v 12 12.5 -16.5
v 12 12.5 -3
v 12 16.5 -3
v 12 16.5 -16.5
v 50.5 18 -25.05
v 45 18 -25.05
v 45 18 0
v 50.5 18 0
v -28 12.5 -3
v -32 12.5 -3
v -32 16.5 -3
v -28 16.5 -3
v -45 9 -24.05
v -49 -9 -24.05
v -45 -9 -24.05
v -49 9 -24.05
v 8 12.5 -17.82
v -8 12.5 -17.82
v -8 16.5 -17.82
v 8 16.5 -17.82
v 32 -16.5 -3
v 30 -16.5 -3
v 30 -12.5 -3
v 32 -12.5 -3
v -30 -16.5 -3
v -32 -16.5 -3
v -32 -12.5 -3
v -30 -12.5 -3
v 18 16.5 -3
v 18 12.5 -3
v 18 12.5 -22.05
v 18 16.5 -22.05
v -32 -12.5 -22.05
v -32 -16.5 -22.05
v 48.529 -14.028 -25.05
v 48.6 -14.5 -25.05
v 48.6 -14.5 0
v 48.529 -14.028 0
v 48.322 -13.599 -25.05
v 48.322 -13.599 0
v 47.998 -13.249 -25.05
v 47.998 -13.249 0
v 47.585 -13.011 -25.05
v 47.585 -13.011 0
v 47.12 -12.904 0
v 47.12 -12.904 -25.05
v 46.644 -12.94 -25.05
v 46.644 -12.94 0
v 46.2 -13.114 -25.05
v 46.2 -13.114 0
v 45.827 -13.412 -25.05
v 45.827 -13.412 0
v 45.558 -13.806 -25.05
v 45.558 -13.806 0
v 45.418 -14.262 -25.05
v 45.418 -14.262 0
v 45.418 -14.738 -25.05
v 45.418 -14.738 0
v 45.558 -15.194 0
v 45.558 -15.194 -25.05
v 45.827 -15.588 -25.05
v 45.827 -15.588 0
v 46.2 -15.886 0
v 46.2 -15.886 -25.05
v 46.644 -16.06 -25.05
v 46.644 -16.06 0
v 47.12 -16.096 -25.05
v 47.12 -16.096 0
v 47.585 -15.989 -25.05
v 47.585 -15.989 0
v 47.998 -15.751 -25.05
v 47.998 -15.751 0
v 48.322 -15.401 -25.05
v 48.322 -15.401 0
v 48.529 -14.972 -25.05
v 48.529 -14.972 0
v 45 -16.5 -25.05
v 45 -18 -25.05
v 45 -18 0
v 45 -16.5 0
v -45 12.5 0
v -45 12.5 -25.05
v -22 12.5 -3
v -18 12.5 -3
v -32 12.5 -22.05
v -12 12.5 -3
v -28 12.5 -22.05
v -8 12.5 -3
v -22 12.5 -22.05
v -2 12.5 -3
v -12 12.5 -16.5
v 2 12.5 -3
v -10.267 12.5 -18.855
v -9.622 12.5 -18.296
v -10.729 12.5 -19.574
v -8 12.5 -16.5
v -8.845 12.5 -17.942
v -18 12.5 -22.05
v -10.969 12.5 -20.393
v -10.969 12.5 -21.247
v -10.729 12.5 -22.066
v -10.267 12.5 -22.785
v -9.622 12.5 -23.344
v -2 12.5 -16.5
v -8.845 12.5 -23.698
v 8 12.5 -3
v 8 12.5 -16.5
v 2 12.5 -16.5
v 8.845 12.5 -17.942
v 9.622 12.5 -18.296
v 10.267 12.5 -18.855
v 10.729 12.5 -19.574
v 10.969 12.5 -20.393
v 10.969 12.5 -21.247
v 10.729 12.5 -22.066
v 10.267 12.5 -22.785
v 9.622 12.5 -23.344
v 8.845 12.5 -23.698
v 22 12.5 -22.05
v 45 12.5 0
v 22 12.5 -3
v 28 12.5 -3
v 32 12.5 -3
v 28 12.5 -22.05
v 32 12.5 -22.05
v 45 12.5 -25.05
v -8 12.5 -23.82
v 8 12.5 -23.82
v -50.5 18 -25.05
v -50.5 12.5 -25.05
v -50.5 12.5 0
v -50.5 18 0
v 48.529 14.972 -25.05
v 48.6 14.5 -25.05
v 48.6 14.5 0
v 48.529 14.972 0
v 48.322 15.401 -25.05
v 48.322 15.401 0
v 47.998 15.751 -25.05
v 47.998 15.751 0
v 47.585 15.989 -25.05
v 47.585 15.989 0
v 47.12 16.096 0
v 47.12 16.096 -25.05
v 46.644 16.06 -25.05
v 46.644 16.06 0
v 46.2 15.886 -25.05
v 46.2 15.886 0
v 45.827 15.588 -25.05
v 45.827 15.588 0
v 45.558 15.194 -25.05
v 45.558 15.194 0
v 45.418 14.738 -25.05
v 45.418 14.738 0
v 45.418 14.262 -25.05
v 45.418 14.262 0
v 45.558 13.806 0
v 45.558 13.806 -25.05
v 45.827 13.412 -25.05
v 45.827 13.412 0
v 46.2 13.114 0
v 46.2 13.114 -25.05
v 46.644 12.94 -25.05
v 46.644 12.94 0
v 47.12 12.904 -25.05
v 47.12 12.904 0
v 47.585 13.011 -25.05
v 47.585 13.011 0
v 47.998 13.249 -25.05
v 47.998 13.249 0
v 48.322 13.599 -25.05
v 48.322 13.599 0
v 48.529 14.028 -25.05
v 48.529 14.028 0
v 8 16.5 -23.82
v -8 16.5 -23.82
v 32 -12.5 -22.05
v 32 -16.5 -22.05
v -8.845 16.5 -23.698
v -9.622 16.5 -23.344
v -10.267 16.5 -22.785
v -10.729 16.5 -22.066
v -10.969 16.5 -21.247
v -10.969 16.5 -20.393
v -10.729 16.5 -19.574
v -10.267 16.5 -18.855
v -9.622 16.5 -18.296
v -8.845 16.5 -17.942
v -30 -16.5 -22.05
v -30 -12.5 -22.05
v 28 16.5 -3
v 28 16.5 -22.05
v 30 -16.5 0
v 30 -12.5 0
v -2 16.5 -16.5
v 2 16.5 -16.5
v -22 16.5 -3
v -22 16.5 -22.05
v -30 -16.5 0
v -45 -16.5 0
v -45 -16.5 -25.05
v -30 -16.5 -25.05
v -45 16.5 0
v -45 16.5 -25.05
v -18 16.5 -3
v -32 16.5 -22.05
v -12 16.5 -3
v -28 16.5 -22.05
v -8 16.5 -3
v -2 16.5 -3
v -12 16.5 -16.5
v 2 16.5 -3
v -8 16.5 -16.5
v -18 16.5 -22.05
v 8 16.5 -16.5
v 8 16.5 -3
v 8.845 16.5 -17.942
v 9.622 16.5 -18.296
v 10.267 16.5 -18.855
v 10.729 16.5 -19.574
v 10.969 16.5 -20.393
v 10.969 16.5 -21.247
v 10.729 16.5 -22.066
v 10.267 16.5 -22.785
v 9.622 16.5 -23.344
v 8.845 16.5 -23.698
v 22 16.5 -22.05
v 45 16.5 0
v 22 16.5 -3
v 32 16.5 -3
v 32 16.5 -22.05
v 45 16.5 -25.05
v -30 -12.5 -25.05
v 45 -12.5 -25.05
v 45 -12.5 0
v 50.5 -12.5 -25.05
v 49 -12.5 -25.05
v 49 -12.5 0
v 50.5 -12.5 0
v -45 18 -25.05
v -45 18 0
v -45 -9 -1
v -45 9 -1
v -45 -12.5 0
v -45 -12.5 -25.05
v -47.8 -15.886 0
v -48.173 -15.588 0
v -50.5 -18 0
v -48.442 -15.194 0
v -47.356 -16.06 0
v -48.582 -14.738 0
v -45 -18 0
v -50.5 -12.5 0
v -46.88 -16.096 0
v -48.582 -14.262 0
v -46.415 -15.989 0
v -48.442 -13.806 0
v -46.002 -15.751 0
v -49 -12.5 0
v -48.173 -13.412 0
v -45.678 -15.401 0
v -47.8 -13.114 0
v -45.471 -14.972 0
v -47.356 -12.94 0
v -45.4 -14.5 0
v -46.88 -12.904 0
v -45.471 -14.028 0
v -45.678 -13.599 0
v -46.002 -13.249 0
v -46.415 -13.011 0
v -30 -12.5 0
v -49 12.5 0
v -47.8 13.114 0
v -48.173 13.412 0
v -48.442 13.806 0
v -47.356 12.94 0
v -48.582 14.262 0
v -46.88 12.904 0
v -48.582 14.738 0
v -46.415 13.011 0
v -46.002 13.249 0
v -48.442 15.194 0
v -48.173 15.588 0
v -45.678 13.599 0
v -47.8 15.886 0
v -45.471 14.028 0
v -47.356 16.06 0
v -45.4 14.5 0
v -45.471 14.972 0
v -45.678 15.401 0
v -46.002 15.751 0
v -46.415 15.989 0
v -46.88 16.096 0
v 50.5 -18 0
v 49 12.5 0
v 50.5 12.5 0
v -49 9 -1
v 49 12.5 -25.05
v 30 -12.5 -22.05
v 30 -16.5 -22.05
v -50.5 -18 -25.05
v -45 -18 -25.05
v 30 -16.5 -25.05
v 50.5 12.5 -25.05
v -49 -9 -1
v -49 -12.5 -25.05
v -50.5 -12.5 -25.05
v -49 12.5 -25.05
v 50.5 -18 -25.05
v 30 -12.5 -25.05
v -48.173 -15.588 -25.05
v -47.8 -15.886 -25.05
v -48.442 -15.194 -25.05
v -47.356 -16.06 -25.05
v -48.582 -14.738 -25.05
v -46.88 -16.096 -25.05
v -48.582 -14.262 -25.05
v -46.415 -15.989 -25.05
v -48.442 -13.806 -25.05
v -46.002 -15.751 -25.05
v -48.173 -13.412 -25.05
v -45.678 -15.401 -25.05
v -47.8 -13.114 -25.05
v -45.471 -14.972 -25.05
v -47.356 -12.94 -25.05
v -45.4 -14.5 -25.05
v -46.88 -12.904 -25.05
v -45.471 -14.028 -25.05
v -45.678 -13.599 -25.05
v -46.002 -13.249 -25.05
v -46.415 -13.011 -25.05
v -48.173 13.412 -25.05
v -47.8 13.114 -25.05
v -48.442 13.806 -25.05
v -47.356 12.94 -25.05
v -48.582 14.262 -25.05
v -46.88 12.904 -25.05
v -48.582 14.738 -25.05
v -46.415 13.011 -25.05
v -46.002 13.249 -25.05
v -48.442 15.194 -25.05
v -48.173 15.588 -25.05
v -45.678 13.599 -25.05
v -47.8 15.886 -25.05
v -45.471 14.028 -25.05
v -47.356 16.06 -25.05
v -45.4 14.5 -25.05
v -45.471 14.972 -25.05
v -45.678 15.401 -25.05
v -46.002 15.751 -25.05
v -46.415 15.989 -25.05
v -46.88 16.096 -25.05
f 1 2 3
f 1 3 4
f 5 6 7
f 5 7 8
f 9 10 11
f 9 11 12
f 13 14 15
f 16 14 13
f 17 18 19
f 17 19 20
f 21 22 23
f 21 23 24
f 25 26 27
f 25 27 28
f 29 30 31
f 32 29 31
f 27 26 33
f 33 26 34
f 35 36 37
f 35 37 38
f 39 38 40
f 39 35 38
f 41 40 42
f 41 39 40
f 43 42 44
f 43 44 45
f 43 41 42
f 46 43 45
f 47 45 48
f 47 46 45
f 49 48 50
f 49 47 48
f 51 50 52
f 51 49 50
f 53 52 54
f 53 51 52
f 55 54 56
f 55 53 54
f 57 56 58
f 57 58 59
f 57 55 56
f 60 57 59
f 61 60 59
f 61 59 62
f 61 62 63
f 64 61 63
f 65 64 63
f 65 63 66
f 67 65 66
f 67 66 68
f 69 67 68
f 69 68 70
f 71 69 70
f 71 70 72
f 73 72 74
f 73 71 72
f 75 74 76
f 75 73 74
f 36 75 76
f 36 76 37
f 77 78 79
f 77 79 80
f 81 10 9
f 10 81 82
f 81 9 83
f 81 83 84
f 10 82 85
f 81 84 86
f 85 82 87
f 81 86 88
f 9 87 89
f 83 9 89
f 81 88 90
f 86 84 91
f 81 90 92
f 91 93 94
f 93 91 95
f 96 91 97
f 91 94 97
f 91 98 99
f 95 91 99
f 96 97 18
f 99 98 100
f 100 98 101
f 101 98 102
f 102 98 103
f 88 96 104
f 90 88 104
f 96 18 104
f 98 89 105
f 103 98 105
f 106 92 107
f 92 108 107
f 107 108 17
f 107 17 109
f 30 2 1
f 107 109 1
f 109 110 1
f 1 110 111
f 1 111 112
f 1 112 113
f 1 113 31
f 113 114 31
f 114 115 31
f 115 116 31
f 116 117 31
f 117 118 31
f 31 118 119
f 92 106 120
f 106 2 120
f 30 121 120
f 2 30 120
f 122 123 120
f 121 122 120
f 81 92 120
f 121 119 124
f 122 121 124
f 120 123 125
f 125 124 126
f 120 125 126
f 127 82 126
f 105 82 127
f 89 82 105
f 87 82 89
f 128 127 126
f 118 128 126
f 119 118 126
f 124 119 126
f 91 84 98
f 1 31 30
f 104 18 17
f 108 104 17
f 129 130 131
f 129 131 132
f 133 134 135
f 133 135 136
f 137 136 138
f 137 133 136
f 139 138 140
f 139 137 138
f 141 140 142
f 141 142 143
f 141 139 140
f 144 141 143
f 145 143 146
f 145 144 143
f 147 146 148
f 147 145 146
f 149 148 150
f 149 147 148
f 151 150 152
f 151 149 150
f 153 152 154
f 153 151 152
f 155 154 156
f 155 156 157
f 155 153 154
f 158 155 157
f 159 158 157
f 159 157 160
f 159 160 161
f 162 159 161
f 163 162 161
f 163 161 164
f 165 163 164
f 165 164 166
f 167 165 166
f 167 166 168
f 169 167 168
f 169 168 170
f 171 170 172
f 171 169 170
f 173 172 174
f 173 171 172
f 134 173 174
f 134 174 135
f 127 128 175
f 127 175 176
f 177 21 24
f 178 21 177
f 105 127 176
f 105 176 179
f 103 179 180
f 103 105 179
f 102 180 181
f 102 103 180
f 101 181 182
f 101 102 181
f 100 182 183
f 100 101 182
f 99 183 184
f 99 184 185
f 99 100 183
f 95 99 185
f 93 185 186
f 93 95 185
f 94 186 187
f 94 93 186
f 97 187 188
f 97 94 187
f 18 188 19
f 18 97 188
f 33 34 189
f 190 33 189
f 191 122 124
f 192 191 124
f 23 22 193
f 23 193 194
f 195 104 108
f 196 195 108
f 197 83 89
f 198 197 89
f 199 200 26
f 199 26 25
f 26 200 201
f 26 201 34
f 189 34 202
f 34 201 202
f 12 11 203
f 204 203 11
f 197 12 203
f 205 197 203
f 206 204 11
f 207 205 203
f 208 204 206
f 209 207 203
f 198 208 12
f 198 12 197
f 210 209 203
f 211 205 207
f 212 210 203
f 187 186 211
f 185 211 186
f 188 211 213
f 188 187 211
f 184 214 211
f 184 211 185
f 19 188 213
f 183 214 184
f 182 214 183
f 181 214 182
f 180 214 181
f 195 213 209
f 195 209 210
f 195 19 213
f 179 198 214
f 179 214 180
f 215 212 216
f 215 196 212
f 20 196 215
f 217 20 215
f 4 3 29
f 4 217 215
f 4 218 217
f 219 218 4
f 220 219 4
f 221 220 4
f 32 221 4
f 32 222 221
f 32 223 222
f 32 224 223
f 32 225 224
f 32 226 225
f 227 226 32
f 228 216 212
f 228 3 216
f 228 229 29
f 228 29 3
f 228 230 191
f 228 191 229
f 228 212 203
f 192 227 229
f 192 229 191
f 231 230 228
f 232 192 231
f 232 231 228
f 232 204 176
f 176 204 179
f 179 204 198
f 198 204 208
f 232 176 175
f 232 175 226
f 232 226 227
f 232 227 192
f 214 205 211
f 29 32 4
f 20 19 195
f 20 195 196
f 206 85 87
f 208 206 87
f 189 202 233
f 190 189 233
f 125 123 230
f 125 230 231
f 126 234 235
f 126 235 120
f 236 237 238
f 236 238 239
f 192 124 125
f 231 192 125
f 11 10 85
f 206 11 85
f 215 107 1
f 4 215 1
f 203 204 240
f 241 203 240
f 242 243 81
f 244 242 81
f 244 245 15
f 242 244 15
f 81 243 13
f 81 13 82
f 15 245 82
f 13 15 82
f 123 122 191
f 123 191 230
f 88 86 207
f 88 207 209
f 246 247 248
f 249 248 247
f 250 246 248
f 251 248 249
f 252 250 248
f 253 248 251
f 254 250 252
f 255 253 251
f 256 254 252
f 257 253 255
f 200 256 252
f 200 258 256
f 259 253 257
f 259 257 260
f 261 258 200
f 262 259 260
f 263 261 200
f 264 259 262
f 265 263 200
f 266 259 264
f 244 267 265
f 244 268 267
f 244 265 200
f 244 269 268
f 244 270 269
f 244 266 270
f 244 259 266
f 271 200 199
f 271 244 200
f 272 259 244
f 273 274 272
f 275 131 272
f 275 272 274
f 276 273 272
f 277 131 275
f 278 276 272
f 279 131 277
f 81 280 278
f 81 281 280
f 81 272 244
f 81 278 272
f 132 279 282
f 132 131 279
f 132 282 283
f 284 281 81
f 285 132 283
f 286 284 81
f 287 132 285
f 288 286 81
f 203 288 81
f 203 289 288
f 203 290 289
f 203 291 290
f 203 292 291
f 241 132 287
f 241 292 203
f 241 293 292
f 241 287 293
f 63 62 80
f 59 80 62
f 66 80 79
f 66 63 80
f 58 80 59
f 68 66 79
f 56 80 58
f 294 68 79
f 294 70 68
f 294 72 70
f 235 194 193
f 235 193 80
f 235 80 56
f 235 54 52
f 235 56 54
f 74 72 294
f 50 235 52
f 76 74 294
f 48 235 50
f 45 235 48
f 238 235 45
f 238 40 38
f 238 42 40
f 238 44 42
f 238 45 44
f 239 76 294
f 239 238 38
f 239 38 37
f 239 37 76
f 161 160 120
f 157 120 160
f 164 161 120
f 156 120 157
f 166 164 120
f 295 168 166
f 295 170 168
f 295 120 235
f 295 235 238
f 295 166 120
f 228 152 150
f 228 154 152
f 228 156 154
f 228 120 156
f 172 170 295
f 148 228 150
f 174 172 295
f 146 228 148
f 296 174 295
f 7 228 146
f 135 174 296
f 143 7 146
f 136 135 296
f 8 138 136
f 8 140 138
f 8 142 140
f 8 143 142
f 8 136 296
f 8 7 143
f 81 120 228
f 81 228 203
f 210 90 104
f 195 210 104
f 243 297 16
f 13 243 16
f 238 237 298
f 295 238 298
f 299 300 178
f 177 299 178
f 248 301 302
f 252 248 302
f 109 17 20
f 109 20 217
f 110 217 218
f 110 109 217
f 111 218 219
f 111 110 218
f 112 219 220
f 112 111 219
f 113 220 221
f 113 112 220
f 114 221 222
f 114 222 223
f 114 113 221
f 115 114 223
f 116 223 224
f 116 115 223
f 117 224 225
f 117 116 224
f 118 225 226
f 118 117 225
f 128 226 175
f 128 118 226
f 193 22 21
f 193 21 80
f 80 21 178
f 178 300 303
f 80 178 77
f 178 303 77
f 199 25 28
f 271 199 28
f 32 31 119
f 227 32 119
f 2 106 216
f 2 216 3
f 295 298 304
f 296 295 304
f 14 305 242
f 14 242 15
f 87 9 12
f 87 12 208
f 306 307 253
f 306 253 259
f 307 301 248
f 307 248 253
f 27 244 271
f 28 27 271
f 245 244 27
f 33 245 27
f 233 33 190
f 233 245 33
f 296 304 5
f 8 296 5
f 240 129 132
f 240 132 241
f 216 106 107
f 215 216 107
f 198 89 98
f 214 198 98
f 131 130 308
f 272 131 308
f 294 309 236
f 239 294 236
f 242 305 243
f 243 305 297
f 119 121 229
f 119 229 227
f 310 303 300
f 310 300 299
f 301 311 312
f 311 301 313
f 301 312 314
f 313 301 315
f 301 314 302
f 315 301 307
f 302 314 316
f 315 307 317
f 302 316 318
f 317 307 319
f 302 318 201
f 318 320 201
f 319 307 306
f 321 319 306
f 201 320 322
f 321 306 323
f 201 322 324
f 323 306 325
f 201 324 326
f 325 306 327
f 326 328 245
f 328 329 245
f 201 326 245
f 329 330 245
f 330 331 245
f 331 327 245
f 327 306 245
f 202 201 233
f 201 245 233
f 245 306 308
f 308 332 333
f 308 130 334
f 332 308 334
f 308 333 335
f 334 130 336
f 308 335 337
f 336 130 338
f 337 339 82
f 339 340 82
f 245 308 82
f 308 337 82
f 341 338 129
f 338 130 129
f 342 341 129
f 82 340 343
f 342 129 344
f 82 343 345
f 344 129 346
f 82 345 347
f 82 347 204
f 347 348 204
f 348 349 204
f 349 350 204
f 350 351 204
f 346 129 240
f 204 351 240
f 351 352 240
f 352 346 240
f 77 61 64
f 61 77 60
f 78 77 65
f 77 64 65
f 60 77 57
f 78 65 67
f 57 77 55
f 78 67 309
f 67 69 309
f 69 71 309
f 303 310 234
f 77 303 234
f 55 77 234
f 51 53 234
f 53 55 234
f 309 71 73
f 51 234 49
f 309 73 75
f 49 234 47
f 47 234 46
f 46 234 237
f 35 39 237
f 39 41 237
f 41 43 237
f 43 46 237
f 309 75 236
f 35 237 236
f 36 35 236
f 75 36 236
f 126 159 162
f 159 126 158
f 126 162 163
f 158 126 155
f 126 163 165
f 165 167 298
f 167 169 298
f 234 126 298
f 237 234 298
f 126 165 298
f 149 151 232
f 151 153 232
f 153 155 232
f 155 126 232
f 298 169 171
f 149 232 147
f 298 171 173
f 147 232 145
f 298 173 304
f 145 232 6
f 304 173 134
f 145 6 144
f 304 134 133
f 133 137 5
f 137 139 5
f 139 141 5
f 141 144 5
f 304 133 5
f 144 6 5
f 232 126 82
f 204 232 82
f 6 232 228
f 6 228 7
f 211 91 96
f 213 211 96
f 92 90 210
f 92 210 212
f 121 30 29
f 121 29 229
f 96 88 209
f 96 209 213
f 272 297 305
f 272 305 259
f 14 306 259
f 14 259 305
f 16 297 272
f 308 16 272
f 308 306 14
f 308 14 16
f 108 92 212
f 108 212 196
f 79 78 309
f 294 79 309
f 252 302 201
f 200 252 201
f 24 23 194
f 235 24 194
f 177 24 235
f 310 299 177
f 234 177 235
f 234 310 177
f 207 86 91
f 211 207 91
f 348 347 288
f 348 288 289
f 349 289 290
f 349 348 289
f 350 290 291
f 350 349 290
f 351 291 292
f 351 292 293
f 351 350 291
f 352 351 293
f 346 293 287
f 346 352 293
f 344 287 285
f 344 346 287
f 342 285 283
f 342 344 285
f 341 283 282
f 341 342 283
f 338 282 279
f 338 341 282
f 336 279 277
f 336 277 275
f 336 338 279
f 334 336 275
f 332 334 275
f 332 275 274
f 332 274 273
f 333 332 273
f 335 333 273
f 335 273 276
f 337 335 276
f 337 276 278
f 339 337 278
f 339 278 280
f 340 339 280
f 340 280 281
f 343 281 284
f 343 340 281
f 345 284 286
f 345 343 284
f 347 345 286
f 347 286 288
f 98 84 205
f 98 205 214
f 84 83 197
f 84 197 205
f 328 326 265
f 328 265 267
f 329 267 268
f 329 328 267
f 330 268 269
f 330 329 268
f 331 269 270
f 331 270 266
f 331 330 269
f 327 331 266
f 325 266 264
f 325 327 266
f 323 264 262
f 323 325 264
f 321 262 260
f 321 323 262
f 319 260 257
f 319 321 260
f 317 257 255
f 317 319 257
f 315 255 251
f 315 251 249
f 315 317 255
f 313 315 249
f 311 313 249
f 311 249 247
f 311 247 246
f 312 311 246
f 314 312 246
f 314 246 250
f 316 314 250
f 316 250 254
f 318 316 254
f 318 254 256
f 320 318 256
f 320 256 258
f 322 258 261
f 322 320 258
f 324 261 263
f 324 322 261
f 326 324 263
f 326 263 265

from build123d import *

# Parameters (mm, degrees)
SKETCH_1_W          = 98
SKETCH_1_H          = 33
SKETCH_1_W_2        = 90
SKETCH_1_H_2        = 25
EXTRUDE_1_DEPTH     = 25.05
SKETCH_2_W          = 5.5
SKETCH_2_H          = 5.5
EXTRUDE_2_DEPTH     = 25.05
SKETCH_3_W          = 5.5
SKETCH_3_H          = 5.5
EXTRUDE_3_DEPTH     = 25.05
SKETCH_4_W          = 5.5
SKETCH_4_H          = 5.5
EXTRUDE_4_DEPTH     = 25.05
SKETCH_5_W          = 5.5
SKETCH_5_H          = 5.5
EXTRUDE_5_DEPTH     = 25.05
SKETCH_6_R          = 1.6
CUT_EXTRUDE_1_DEPTH = 25.05
SKETCH_7_W          = 4
SKETCH_7_H          = 19.05
CUT_EXTRUDE_2_DEPTH = 4
SKETCH_8_W          = 4
SKETCH_8_H          = 19.05
SKETCH_8_H_2        = 13.5
CUT_EXTRUDE_3_DEPTH = 4
SKETCH_9_W          = 23.05
SKETCH_9_H          = 18
CUT_EXTRUDE_4_DEPTH = 4
SKETCH_10_W         = 60
SKETCH_10_H         = 4.5
CUT_EXTRUDE_5_DEPTH = 25.05
CUT_EXTRUDE_6_DEPTH = 4


with BuildPart() as part:
    # 草图1 → 凸台-拉伸1 (new body)
    with BuildSketch(Plane.XY.offset(-25.05)):
        Rectangle(SKETCH_1_W, SKETCH_1_H)
        Rectangle(SKETCH_1_W_2, SKETCH_1_H_2, mode=Mode.SUBTRACT)
    extrude(amount=EXTRUDE_1_DEPTH)

    # 草图2 → 凸台-拉伸2 (add)
    with BuildSketch(Plane.XY.offset(-25.05)):
        with Locations((47.75, 15.25)):
            Rectangle(SKETCH_2_W, SKETCH_2_H)
    extrude(amount=EXTRUDE_2_DEPTH)

    # 草图3 → 凸台-拉伸3 (add)
    with BuildSketch(Plane.XY.offset(-25.05)):
        with Locations((47.75, -15.25)):
            Rectangle(SKETCH_3_W, SKETCH_3_H)
    extrude(amount=EXTRUDE_3_DEPTH)

    # 草图4 → 凸台-拉伸4 (add)
    with BuildSketch(Plane.XY.offset(-25.05)):
        with Locations((-47.75, 15.25)):
            Rectangle(SKETCH_4_W, SKETCH_4_H)
    extrude(amount=EXTRUDE_4_DEPTH)

    # 草图5 → 凸台-拉伸5 (add)
    with BuildSketch(Plane.XY.offset(-25.05)):
        with Locations((-47.75, -15.25)):
            Rectangle(SKETCH_5_W, SKETCH_5_H)
    extrude(amount=EXTRUDE_5_DEPTH)

    # 草图6 → 切除-拉伸1 (cut)
    with BuildSketch(Plane.XY.offset(-25.05)):
        with Locations((-47, -14.5)):
            Circle(SKETCH_6_R)
        with Locations((-47, 14.5)):
            Circle(SKETCH_6_R)
        with Locations((47, -14.5)):
            Circle(SKETCH_6_R)
        with Locations((47, 14.5)):
            Circle(SKETCH_6_R)
    extrude(amount=CUT_EXTRUDE_1_DEPTH, mode=Mode.SUBTRACT)

    # 草图7 → 切除-拉伸2 (cut)
    with BuildSketch(Plane(origin=(0, -16.5, 0), x_dir=(1, 0, 0), z_dir=(0, 1, 0))):
        with Locations((-30, 12.525)):
            Rectangle(SKETCH_7_W, SKETCH_7_H)
        with Locations((-20, 12.525)):
            Rectangle(SKETCH_7_W, SKETCH_7_H)
        with Locations((-10, 12.525)):
            Rectangle(SKETCH_7_W, SKETCH_7_H)
        with Locations((0, 12.525)):
            Rectangle(SKETCH_7_W, SKETCH_7_H)
        with Locations((10, 12.525)):
            Rectangle(SKETCH_7_W, SKETCH_7_H)
        with Locations((20, 12.525)):
            Rectangle(SKETCH_7_W, SKETCH_7_H)
        with Locations((30, 12.525)):
            Rectangle(SKETCH_7_W, SKETCH_7_H)
    extrude(amount=CUT_EXTRUDE_2_DEPTH, mode=Mode.SUBTRACT)

    # 草图8 → 切除-拉伸3 (cut)
    with BuildSketch(Plane(origin=(0, 12.5, 0), x_dir=(1, 0, 0), z_dir=(0, 1, 0))):
        with Locations((-30, 12.525)):
            Rectangle(SKETCH_8_W, SKETCH_8_H)
        with Locations((-20, 12.525)):
            Rectangle(SKETCH_8_W, SKETCH_8_H)
        with Locations((-10, 9.75)):
            Rectangle(SKETCH_8_W, SKETCH_8_H_2)
        with Locations((0, 9.75)):
            Rectangle(SKETCH_8_W, SKETCH_8_H_2)
        with Locations((10, 9.75)):
            Rectangle(SKETCH_8_W, SKETCH_8_H_2)
        with Locations((20, 12.525)):
            Rectangle(SKETCH_8_W, SKETCH_8_H)
        with Locations((30, 12.525)):
            Rectangle(SKETCH_8_W, SKETCH_8_H)
    extrude(amount=CUT_EXTRUDE_3_DEPTH, mode=Mode.SUBTRACT)

    # 草图9 → 切除-拉伸4 (cut)
    with BuildSketch(Plane(origin=(-49, 0, 0), x_dir=(0, 0, -1), z_dir=(1, 0, 0))):
        with Locations((12.525, 0)):
            Rectangle(SKETCH_9_W, SKETCH_9_H)
    extrude(amount=CUT_EXTRUDE_4_DEPTH, mode=Mode.SUBTRACT)

    # 草图10 → 切除-拉伸5 (cut)
    with BuildSketch(Plane.XY.offset(-25.05)):
        with Locations((0, -14.75)):
            Rectangle(SKETCH_10_W, SKETCH_10_H)
    extrude(amount=CUT_EXTRUDE_5_DEPTH, mode=Mode.SUBTRACT)

    # 草图11 → 切除-拉伸6 (cut)
    with BuildSketch(Plane(origin=(0, 12.5, 0), x_dir=(1, 0, 0), z_dir=(0, 1, 0))):
        with BuildLine():
            Line((-8, 17.82), (8, 17.82))
            ThreePointArc((8, 17.82), (11, 20.82), (8, 23.82))
            Line((8, 23.82), (-8, 23.82))
            ThreePointArc((-8, 23.82), (-11, 20.82), (-8, 17.82))
        make_face()
    extrude(amount=CUT_EXTRUDE_6_DEPTH, mode=Mode.SUBTRACT)


solid = part.part
